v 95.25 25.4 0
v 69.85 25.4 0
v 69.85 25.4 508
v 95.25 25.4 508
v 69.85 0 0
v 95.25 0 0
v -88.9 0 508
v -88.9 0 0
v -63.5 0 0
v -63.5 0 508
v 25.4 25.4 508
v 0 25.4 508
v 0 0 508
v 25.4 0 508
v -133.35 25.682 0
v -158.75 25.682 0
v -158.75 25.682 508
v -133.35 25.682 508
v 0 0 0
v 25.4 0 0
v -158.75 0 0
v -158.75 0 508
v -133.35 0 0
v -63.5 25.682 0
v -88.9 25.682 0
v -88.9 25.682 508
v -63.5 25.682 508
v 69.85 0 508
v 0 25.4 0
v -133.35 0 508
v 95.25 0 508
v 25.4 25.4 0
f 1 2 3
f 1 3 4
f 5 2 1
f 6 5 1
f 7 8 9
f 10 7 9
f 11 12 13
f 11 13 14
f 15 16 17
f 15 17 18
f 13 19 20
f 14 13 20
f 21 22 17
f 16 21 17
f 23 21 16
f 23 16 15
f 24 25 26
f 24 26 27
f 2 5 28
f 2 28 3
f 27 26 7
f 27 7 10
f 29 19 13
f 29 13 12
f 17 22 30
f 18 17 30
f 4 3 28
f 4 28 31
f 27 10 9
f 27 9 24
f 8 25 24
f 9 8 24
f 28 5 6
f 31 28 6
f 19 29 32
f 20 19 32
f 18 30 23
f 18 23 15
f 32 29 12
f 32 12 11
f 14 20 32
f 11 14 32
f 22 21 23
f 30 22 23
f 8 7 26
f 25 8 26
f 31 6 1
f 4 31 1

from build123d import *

# Parameters (mm, degrees)
F1_W     = 25.4
F1_H     = 25.4
F2_DEPTH = 508
F1_H_2   = 25.6818179041


with BuildPart() as f2:
    # F1 (on Top) → F2 (new body)
    with BuildSketch(Plane.XY):
        with Locations((12.7, 12.7)):
            Rectangle(F1_W, F1_H)
    extrude(amount=F2_DEPTH)


with BuildPart() as f2b:
    # F1 (on Top) → F2, piece 2 (new body)
    with BuildSketch(Plane.XY):
        with Locations((82.55, 12.7)):
            Rectangle(F1_W, F1_H)
    extrude(amount=F2_DEPTH)


with BuildPart() as f2c:
    # F1 (on Top) → F2, piece 3 (new body)
    with BuildSketch(Plane.XY):
        with Locations((-76.2, 12.8409089521)):
            Rectangle(F1_W, F1_H_2)
    extrude(amount=F2_DEPTH)


with BuildPart() as f2d:
    # F1 (on Top) → F2, piece 4 (new body)
    with BuildSketch(Plane.XY):
        with Locations((-146.05, 12.8409089521)):
            Rectangle(F1_W, F1_H_2)
    extrude(amount=F2_DEPTH)


solid = Compound([f2.part, f2b.part, f2c.part, f2d.part])
